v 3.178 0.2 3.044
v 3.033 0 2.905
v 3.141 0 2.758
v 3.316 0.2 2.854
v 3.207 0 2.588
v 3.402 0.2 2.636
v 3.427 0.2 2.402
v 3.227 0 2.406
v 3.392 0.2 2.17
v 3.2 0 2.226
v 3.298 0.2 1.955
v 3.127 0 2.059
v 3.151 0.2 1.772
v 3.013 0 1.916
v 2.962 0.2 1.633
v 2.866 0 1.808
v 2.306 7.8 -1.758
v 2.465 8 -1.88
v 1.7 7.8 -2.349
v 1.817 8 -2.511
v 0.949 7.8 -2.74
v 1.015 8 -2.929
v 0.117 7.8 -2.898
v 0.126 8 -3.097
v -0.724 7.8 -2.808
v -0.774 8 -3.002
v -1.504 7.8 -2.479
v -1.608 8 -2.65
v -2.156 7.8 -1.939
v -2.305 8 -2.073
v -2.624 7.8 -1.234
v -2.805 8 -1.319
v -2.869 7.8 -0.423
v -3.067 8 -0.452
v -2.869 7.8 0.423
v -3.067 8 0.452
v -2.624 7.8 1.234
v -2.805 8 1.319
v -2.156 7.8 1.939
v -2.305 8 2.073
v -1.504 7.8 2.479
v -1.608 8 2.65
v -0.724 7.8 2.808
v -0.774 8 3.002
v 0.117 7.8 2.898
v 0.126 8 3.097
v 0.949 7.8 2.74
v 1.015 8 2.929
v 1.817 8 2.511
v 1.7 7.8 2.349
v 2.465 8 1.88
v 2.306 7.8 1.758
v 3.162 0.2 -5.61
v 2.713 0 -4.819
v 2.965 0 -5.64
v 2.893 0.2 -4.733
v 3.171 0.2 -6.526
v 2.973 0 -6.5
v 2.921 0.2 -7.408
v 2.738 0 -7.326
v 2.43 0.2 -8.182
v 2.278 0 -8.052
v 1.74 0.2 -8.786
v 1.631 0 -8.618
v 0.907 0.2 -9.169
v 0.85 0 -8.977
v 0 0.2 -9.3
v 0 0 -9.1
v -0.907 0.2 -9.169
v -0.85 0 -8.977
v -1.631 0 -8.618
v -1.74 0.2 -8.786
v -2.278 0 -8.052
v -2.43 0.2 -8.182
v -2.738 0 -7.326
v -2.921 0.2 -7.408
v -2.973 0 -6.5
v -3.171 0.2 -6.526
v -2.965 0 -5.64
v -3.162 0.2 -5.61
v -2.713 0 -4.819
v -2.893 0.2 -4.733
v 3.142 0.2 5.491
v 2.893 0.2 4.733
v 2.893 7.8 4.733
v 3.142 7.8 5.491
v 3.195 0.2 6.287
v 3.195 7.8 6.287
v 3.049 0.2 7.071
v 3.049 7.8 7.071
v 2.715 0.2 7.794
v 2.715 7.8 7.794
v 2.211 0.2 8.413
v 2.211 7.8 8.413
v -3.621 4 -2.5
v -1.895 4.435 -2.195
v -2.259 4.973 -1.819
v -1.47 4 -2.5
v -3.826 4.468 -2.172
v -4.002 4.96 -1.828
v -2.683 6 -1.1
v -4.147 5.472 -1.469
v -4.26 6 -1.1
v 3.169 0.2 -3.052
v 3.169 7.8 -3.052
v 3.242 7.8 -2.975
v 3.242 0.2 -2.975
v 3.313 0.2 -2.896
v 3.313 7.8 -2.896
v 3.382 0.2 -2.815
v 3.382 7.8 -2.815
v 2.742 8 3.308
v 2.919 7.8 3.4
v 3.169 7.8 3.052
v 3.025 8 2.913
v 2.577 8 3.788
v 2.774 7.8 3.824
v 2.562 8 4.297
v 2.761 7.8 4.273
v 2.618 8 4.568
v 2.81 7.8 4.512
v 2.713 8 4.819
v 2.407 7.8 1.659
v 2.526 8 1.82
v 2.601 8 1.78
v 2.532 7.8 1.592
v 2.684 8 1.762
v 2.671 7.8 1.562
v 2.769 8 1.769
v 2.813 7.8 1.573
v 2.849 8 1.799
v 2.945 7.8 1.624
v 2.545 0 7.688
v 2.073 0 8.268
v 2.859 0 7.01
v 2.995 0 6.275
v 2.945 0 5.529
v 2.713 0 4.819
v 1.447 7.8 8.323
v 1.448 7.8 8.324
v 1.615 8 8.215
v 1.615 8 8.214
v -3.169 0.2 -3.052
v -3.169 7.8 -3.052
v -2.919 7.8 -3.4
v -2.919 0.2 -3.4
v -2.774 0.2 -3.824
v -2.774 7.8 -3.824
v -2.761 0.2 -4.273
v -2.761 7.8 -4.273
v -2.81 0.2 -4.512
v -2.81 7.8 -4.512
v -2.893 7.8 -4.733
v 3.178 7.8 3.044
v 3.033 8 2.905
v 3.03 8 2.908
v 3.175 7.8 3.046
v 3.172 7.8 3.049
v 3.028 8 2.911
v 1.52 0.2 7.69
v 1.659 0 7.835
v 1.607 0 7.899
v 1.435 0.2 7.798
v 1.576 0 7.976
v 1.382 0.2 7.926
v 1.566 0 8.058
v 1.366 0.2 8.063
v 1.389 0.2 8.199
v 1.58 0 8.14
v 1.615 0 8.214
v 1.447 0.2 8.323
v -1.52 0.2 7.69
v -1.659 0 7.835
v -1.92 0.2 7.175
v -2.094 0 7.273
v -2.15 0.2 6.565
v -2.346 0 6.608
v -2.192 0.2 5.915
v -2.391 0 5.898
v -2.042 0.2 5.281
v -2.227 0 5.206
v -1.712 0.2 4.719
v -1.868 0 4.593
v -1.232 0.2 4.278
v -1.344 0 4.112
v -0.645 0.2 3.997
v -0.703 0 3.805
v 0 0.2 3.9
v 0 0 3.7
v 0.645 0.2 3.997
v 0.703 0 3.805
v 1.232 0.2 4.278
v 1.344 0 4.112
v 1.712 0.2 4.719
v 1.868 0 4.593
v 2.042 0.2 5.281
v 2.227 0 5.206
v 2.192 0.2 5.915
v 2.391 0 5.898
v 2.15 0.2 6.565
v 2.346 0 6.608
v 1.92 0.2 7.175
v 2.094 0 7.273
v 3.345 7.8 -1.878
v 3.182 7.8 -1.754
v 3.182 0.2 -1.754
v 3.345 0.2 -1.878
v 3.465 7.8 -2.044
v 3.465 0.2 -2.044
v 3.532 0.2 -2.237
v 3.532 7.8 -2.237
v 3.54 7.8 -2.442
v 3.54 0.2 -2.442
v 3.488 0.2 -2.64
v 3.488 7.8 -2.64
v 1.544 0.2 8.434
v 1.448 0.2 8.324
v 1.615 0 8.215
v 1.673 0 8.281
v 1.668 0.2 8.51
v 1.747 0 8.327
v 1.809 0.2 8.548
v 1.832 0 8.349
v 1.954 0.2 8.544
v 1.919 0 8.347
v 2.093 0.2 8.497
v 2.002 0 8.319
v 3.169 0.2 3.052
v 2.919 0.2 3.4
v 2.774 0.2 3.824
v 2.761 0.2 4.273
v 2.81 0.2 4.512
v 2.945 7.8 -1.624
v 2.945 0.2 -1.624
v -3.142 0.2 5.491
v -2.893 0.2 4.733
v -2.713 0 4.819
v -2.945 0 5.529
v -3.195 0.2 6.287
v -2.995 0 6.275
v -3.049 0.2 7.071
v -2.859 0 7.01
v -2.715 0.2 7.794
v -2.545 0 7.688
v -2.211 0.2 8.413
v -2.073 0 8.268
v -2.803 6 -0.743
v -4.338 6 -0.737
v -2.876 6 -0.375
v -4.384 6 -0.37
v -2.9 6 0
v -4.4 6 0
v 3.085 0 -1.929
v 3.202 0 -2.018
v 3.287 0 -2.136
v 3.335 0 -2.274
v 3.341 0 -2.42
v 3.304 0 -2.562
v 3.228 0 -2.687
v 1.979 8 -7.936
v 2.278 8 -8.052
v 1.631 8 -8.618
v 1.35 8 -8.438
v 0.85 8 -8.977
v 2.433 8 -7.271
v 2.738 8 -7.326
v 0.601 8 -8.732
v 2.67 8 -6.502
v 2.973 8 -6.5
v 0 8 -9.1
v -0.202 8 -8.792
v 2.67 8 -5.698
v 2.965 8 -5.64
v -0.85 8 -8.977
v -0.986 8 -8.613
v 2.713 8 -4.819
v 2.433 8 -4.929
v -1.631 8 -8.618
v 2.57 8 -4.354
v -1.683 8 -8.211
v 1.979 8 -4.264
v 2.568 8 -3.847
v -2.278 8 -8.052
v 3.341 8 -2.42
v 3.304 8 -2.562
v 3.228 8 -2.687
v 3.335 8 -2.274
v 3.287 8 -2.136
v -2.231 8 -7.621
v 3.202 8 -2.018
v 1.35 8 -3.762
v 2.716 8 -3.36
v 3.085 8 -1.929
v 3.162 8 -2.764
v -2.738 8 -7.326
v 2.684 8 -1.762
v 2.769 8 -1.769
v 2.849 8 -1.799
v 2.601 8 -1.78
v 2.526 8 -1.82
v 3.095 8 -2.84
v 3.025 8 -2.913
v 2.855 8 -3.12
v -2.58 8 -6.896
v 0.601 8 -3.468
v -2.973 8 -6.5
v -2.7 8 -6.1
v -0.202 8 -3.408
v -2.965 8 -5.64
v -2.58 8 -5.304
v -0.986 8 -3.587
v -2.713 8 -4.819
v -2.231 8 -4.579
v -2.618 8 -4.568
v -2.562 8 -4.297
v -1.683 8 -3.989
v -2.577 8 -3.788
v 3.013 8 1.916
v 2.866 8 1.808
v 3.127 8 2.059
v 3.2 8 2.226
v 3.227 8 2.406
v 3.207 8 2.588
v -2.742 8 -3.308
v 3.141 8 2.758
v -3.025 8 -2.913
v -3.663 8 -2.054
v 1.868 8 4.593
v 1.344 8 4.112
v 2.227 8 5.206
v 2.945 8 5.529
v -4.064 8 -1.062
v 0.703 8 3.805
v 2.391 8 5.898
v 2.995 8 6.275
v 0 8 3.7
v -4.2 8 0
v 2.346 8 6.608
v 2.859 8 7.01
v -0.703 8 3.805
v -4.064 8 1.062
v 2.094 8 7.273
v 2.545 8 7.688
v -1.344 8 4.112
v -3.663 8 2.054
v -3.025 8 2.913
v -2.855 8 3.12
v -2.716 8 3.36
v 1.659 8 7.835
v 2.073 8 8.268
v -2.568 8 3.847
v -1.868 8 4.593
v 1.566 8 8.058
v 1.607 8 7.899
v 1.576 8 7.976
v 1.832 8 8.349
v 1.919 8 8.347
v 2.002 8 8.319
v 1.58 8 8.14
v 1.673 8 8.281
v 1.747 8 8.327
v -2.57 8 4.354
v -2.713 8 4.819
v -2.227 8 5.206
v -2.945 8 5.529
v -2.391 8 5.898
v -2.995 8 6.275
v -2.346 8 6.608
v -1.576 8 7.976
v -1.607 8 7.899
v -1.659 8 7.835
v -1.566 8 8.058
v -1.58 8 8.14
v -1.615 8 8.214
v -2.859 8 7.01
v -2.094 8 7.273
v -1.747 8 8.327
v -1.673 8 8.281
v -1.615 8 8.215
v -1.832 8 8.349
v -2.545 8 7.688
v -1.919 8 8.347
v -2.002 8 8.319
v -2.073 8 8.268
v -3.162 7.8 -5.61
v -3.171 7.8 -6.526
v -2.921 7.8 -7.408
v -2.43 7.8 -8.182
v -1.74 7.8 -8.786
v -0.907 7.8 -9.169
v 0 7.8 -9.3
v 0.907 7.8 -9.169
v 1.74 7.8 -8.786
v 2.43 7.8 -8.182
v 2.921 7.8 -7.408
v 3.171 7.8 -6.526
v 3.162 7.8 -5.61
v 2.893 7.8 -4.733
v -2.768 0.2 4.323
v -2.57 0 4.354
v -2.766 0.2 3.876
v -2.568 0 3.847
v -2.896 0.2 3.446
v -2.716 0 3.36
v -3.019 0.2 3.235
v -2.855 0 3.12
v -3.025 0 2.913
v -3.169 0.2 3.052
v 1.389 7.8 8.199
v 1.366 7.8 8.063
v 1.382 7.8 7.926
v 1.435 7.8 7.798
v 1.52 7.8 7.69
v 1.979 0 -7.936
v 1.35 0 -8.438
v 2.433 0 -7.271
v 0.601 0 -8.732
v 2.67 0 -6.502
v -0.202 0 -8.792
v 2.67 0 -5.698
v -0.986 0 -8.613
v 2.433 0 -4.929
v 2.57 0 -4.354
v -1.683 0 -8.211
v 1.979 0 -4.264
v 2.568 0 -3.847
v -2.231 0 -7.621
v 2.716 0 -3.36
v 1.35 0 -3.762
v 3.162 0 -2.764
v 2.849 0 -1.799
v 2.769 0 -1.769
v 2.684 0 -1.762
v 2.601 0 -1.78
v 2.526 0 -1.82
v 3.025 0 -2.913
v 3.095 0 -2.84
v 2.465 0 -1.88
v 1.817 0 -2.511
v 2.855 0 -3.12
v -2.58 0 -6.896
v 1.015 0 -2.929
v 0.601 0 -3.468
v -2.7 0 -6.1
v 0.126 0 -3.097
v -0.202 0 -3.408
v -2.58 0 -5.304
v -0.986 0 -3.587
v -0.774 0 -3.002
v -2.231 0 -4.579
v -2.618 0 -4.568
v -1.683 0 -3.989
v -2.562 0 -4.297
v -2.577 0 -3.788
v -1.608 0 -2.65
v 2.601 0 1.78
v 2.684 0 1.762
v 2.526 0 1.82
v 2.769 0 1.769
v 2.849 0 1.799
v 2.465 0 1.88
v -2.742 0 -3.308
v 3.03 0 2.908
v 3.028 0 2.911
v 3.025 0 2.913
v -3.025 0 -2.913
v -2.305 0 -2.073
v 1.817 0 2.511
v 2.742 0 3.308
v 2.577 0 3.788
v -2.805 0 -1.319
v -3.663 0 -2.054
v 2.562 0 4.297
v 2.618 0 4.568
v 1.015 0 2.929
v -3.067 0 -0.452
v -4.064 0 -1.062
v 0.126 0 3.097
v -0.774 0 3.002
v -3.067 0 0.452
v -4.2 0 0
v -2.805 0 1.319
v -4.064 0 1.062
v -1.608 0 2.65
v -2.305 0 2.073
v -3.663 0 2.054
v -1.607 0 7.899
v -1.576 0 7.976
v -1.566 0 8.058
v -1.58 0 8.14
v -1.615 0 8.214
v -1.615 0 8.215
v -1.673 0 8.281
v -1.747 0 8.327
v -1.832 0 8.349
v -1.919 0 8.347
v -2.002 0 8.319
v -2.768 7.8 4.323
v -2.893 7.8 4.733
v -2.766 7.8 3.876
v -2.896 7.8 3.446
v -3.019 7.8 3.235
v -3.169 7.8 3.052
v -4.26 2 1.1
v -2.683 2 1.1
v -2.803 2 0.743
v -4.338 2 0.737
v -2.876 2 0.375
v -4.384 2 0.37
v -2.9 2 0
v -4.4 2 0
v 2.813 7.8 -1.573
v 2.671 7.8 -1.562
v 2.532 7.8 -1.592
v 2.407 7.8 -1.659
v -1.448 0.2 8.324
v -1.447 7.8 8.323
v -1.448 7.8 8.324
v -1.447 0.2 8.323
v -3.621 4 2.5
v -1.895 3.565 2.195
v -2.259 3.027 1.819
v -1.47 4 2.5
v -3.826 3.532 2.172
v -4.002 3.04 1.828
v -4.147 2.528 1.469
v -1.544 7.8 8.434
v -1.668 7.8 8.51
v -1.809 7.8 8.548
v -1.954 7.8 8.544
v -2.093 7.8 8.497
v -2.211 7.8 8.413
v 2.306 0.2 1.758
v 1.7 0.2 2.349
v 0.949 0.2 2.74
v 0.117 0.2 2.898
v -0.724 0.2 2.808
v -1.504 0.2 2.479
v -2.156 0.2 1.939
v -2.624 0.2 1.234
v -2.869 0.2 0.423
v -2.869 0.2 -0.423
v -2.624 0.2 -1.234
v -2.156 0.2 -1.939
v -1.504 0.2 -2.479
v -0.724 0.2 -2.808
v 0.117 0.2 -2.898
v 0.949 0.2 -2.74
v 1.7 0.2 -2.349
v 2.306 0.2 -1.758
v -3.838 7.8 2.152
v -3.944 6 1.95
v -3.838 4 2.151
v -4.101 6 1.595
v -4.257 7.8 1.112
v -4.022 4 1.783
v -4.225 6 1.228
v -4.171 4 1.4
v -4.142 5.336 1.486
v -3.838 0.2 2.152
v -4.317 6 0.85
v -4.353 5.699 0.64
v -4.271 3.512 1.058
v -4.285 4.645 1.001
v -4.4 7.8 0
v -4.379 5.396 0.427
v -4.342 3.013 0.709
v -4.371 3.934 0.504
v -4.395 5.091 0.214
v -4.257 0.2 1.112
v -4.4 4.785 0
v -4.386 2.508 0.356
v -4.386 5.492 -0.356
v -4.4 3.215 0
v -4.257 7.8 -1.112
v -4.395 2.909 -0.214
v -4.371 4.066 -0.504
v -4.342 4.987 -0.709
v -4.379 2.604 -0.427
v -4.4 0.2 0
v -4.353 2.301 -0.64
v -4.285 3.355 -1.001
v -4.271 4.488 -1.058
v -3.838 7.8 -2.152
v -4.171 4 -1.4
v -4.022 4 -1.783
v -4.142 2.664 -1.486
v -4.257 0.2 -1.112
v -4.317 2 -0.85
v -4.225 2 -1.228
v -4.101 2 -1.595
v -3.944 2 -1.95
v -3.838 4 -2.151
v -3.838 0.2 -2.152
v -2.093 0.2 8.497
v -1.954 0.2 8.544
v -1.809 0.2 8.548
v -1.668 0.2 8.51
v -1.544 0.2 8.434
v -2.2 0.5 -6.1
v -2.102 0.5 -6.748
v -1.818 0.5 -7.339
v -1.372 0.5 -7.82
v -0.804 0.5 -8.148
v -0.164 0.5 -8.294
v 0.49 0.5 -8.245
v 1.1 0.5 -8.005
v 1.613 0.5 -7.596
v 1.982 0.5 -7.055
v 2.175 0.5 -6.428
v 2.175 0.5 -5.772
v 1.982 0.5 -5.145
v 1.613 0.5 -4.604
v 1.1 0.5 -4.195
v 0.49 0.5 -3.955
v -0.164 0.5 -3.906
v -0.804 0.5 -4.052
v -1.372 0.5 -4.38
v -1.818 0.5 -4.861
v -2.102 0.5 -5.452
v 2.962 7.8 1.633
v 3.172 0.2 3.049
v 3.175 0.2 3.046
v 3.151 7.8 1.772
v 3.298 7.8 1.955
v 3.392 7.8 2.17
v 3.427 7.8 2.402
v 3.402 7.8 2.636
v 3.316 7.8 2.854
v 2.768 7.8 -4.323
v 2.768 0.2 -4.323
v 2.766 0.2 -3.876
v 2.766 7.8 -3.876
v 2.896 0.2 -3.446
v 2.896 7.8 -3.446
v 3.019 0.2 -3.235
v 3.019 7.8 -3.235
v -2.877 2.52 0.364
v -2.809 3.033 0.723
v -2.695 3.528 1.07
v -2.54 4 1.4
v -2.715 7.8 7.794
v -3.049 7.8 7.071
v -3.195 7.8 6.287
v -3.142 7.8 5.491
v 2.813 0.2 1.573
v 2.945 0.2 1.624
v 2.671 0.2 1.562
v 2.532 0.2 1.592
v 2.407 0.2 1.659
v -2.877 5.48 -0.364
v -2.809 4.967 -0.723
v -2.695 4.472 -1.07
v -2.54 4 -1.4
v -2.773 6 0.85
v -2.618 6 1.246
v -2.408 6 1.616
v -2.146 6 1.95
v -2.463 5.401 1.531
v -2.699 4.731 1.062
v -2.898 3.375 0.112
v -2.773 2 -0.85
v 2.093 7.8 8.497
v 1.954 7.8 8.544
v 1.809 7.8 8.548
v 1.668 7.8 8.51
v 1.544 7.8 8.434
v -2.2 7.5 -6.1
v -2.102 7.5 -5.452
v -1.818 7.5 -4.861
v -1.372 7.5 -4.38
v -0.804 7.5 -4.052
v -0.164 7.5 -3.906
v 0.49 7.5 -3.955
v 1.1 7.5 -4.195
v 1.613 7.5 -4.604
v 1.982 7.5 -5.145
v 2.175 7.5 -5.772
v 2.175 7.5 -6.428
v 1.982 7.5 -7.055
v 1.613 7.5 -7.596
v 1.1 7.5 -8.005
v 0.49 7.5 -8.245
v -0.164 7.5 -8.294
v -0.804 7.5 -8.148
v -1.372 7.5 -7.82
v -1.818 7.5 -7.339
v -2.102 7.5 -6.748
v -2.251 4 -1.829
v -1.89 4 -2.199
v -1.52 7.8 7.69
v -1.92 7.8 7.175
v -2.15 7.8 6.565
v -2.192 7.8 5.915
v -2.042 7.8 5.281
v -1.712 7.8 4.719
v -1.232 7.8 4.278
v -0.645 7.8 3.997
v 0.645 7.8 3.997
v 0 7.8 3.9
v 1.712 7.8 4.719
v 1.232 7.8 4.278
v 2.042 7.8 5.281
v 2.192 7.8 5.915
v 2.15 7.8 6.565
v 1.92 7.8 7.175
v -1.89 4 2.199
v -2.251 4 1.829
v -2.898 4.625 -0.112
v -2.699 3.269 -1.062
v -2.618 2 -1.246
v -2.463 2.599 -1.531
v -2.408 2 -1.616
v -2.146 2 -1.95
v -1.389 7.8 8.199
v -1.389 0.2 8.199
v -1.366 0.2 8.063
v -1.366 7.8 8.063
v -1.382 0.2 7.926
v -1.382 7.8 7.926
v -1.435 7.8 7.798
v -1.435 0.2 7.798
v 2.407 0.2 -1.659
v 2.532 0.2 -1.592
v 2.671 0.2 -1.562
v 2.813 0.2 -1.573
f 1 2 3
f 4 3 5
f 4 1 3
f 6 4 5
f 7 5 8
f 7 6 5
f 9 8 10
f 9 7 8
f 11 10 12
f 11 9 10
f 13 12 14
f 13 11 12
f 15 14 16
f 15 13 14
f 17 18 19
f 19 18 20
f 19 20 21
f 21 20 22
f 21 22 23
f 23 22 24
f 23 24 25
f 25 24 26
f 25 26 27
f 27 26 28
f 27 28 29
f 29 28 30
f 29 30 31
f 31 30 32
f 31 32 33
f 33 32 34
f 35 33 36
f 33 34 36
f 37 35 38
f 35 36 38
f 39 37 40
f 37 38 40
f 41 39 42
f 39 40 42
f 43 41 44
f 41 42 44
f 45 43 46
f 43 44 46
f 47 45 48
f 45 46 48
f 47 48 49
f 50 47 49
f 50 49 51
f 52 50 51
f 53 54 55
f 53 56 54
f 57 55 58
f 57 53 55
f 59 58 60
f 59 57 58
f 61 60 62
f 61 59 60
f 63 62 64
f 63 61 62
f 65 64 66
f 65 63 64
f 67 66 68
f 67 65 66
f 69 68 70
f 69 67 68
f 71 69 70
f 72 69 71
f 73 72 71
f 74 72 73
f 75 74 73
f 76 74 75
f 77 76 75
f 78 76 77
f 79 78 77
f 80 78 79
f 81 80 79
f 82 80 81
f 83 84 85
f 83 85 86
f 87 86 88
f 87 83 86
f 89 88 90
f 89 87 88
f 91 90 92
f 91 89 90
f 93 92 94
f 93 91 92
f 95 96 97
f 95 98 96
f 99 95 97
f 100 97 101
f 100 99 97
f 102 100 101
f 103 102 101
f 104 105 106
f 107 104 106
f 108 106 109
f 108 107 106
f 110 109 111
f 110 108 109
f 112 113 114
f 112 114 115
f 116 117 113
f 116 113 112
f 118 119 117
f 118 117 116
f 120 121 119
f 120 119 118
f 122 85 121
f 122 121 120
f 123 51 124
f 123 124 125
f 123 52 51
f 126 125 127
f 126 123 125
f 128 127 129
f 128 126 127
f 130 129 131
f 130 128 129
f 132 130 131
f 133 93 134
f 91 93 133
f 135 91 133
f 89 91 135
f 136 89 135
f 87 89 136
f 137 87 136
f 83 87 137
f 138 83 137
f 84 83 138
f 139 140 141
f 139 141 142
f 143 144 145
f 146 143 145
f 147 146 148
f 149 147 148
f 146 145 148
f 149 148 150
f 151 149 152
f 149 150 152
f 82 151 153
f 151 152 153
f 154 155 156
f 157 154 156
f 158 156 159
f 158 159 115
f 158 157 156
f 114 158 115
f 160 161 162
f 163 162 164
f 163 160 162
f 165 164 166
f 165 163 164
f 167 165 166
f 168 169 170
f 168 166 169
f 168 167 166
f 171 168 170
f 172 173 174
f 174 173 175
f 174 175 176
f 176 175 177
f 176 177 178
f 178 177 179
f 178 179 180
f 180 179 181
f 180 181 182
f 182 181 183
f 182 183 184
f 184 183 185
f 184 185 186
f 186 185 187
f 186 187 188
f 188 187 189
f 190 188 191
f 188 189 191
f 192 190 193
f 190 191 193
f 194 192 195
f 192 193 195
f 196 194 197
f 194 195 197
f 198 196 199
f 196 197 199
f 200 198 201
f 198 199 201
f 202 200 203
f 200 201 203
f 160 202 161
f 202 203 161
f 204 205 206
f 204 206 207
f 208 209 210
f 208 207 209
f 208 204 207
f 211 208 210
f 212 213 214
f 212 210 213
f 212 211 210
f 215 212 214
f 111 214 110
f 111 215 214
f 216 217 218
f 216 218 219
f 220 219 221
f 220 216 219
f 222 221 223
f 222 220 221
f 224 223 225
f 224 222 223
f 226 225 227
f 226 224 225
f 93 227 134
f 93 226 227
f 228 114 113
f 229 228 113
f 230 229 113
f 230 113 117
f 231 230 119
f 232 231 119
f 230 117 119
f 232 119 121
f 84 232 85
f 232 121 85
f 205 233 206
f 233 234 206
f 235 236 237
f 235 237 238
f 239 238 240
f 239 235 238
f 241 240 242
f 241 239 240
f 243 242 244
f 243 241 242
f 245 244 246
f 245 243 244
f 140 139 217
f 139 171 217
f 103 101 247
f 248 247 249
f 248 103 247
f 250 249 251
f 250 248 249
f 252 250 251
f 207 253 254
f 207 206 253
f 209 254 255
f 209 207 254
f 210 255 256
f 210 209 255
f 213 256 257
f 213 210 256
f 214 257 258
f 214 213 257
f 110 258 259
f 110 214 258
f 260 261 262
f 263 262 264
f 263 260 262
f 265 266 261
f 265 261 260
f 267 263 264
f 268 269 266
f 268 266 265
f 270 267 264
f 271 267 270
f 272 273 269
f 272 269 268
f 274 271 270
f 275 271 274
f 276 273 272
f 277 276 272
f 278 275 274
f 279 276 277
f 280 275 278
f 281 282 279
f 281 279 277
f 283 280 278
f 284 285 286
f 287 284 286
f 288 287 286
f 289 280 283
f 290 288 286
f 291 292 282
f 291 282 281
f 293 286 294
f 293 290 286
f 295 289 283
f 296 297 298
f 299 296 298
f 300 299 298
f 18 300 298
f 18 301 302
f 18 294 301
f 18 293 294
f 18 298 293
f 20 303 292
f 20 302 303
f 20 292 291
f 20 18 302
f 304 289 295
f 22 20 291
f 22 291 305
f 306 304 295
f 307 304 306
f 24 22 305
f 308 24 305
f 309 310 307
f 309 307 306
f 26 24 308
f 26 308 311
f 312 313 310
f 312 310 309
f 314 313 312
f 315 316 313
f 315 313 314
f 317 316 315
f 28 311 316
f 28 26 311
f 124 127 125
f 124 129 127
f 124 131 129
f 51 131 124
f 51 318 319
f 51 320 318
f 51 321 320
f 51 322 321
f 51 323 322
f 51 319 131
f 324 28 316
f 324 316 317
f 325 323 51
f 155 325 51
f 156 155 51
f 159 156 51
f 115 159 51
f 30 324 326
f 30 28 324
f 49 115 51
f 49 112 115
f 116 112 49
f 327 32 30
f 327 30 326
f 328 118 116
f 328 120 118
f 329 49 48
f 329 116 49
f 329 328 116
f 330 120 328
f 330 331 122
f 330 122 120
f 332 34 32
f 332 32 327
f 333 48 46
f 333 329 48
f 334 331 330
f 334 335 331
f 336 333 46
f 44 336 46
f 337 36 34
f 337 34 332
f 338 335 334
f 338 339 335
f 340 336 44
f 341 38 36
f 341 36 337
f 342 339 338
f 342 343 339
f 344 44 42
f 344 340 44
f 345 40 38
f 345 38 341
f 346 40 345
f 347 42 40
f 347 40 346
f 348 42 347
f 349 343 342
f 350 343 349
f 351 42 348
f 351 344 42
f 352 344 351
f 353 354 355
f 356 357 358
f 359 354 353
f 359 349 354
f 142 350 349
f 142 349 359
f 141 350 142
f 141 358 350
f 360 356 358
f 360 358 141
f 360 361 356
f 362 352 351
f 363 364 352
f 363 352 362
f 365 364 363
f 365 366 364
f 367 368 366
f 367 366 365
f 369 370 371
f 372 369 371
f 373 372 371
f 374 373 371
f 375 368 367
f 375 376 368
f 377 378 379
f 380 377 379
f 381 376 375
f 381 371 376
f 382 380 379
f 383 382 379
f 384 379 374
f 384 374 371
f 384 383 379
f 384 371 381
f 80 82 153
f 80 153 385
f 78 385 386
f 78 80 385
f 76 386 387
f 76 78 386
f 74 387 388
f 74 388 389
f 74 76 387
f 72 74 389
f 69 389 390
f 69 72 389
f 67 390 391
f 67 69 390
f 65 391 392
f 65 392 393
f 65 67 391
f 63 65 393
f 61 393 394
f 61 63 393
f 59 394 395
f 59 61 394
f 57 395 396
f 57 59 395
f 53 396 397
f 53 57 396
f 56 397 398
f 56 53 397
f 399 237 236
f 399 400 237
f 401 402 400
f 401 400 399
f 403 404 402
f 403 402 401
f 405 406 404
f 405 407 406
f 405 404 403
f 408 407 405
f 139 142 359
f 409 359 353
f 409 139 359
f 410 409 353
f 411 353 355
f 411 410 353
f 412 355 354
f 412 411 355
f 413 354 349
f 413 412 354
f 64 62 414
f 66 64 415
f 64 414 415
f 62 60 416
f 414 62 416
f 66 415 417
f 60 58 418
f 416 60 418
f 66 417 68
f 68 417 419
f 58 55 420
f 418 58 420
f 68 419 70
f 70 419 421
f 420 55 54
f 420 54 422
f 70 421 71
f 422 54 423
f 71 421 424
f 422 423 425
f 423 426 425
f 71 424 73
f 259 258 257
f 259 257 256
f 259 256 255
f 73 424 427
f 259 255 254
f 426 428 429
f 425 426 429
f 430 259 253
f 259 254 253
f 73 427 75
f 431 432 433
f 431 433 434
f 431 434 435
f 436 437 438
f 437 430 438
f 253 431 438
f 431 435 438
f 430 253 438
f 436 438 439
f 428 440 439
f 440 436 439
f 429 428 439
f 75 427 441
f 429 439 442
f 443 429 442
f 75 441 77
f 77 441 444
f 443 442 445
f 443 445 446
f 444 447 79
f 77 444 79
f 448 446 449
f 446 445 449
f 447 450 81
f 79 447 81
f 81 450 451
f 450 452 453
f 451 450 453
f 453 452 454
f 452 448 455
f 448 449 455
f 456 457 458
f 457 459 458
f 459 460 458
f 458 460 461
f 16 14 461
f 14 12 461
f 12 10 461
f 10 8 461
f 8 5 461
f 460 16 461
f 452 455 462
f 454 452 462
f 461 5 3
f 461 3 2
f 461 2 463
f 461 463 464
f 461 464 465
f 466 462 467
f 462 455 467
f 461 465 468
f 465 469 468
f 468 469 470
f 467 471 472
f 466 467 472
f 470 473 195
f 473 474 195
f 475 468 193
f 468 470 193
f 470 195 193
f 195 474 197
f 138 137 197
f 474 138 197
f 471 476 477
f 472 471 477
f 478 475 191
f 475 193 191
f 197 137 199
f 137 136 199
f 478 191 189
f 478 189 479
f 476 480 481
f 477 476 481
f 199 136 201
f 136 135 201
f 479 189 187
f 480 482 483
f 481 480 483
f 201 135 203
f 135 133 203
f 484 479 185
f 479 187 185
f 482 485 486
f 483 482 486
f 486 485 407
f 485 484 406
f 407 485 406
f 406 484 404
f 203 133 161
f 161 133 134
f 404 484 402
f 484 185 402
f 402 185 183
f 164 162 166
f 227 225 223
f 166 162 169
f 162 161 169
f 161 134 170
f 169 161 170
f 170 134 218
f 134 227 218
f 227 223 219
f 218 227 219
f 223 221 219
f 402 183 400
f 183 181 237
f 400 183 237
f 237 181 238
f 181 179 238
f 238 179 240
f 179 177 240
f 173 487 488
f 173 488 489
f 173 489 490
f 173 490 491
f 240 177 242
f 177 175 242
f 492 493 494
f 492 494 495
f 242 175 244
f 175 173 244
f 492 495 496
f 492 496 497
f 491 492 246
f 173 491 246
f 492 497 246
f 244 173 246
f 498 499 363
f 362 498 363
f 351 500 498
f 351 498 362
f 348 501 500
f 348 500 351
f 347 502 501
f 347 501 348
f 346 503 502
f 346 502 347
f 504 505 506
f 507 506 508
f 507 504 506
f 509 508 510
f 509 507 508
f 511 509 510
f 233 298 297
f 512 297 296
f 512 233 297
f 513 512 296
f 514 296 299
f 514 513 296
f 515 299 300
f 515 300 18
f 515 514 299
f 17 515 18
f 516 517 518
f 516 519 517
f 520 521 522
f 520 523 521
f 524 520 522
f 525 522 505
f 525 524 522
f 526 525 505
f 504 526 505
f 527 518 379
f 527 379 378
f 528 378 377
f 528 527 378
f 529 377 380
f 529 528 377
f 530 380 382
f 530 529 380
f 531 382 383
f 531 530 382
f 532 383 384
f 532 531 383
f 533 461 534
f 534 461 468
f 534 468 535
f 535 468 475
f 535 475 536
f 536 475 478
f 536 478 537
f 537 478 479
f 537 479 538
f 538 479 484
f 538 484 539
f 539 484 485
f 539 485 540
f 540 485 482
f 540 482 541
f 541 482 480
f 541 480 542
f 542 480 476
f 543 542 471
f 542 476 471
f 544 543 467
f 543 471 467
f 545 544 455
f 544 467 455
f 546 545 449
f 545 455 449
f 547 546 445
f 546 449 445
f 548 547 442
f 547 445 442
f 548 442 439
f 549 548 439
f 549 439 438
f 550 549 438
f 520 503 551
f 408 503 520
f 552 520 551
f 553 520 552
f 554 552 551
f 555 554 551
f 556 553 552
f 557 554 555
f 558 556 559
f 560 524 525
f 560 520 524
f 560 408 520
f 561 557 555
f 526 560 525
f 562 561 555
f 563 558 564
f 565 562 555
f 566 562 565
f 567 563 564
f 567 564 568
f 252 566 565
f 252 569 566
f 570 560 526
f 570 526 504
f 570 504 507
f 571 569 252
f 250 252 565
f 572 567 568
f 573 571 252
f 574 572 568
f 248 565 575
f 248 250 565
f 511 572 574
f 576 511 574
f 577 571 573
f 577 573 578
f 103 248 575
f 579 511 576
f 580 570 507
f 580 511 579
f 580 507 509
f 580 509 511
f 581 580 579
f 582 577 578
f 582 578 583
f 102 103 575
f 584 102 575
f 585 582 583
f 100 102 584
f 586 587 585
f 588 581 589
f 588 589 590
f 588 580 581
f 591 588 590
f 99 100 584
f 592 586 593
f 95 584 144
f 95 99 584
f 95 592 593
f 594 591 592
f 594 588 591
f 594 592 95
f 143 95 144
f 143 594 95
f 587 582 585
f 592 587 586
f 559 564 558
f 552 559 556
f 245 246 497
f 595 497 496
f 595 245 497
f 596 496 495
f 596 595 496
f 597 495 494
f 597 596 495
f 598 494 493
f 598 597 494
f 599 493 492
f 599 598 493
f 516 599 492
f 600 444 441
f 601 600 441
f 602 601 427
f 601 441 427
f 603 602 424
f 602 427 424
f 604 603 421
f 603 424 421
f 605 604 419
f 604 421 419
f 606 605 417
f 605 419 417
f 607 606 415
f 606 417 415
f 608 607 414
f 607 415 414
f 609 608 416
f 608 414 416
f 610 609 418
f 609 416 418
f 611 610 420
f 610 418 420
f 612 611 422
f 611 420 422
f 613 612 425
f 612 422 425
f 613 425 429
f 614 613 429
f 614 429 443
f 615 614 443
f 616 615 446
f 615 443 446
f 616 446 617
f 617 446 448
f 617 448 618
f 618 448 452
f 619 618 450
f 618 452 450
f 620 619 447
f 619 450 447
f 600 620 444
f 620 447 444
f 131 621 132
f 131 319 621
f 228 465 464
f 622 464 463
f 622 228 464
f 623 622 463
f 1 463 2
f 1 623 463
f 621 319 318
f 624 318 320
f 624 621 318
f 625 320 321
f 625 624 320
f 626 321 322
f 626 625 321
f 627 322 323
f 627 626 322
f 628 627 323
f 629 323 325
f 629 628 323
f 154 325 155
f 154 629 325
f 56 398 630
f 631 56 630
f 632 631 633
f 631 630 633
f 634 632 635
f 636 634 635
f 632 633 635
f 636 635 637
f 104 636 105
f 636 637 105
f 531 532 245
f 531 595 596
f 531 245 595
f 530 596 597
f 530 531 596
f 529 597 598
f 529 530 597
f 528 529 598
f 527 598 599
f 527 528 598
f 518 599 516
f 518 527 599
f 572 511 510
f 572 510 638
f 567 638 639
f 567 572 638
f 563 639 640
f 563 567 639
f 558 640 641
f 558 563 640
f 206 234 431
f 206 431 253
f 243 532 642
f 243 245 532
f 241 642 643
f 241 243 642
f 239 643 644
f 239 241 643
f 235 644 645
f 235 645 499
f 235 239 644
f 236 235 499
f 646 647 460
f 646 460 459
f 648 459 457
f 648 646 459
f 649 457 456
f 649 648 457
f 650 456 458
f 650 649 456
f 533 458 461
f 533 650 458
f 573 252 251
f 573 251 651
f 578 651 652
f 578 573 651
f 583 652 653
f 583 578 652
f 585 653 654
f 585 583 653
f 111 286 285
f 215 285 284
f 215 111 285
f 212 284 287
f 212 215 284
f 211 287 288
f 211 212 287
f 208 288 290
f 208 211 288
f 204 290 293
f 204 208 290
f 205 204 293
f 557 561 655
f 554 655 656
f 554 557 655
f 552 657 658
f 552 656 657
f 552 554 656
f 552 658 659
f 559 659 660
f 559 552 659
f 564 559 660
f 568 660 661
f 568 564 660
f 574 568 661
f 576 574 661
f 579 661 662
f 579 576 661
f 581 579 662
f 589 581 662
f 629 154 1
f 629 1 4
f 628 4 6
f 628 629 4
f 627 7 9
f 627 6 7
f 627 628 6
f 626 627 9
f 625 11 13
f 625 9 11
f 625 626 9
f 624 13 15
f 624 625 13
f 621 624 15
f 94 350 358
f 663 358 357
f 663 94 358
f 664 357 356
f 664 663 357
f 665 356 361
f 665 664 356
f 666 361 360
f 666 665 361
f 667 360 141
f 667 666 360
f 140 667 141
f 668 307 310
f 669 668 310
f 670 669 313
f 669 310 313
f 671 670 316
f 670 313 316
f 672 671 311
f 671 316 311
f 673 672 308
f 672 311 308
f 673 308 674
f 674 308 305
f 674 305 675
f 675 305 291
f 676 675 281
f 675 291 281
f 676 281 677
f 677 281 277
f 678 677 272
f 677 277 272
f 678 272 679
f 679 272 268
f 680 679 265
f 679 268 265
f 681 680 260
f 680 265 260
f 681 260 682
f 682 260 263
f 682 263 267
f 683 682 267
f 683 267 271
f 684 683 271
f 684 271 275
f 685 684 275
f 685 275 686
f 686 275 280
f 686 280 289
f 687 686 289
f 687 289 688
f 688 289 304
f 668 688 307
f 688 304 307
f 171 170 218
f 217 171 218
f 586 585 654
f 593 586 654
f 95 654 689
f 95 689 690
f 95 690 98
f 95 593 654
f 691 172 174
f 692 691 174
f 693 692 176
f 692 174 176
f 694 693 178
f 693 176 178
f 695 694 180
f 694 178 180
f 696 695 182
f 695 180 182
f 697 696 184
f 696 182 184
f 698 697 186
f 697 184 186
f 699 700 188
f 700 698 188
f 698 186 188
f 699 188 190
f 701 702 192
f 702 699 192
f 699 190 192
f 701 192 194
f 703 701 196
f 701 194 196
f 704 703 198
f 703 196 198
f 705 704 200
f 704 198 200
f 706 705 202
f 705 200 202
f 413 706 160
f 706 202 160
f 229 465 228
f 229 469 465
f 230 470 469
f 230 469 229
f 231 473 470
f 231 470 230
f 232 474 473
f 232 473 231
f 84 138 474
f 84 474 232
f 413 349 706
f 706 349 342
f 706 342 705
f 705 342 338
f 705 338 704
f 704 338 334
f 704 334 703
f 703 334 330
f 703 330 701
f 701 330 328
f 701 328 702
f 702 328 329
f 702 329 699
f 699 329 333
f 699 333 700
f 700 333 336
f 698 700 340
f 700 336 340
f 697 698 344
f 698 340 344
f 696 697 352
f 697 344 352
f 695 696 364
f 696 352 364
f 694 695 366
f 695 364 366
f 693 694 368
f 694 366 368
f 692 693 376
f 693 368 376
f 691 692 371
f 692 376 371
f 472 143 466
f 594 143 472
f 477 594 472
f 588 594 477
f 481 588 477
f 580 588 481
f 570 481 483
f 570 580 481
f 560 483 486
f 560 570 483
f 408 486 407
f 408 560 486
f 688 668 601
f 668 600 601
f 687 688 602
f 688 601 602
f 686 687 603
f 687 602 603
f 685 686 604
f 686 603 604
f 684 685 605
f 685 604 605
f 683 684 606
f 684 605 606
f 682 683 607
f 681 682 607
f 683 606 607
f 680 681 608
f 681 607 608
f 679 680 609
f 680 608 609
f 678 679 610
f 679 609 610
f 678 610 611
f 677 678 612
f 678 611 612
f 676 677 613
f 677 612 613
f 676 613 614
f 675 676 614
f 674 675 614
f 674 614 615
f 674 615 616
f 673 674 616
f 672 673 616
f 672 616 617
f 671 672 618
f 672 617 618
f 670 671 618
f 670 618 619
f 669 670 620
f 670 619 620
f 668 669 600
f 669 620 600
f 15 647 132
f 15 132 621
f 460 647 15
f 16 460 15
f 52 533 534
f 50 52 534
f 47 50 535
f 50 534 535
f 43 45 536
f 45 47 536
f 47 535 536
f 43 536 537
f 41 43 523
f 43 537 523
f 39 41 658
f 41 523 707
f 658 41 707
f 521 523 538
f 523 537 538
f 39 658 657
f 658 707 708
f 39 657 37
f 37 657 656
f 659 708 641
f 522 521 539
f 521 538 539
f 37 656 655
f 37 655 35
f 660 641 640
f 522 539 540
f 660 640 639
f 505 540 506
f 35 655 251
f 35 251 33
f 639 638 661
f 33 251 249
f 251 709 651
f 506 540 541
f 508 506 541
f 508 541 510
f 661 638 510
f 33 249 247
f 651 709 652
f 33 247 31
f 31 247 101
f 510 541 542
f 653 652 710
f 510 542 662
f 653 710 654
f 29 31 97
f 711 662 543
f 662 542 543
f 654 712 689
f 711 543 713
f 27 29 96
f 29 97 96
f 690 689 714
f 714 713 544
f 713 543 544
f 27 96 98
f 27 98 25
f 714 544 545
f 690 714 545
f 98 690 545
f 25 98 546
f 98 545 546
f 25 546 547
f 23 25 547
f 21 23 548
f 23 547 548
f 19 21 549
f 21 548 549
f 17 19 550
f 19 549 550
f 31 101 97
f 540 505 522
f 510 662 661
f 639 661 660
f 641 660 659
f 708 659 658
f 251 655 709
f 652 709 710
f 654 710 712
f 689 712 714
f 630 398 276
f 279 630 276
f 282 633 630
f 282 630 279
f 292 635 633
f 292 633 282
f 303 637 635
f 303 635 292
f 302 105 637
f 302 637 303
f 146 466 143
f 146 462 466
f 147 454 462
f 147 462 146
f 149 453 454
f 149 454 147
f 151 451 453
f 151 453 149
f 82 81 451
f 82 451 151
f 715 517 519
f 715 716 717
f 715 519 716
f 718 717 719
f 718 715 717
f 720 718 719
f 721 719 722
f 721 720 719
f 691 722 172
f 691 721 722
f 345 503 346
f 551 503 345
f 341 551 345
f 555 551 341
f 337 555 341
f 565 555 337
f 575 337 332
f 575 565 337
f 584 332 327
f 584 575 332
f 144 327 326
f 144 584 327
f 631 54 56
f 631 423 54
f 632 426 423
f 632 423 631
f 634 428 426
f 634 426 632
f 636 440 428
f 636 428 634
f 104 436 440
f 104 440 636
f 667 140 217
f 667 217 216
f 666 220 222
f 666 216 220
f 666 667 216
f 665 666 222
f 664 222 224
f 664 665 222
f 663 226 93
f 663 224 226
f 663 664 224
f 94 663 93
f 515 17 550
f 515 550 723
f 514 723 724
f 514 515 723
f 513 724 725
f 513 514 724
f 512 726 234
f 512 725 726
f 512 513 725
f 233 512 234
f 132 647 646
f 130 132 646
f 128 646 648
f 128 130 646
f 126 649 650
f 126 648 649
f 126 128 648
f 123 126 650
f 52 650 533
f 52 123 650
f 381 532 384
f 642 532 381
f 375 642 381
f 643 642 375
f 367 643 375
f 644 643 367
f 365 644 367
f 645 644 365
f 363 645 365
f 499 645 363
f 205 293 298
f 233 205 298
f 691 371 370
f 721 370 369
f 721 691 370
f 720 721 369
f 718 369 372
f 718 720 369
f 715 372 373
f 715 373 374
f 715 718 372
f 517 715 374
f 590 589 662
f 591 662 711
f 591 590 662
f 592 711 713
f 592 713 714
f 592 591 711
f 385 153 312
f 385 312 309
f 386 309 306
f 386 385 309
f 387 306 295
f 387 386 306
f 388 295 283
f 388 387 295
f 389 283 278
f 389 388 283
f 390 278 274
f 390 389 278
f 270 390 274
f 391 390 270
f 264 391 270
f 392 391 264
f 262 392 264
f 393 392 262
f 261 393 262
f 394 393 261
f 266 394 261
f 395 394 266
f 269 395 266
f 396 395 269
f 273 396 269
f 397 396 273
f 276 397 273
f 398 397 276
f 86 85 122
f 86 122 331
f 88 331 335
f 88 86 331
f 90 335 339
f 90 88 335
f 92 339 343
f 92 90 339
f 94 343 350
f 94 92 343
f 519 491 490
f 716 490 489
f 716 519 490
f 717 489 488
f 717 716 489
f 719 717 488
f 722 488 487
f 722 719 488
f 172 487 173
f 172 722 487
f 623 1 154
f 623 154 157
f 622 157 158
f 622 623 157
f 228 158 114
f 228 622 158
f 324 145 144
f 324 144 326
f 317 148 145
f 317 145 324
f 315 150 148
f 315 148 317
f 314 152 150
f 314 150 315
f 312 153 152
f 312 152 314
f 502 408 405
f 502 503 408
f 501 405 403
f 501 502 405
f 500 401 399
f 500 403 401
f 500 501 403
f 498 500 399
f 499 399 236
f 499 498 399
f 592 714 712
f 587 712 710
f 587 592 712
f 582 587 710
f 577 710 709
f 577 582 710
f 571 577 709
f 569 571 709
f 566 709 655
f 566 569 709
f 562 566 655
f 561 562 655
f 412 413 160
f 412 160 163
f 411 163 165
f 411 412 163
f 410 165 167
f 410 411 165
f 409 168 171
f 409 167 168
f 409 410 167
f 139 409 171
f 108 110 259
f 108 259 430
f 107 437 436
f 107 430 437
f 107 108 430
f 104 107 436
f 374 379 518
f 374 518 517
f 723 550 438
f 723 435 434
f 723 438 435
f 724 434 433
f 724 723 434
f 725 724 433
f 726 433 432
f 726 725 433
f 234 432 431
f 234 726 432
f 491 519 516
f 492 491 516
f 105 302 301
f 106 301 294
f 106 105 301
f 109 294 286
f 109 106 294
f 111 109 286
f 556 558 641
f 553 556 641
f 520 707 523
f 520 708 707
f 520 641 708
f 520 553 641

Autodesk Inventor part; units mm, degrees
ref_plane "XZ Plane" through (0, 0, 0) normal (0, 1, 0) x (-1, 0, 0)
ref_plane "XY Plane" through (0, 0, 0) normal (0, 0, 1) x (1, 0, 0)
sketch "Sketch1" plane through (0, 0, 0) normal (0, 1, 0) x (-1, 0, 0)
  circle A0 centre (0, 0) radius 2.9
  circle A1 centre (0, -6.1) radius 2.2
  circle A2 centre (0, 6.1) radius 2.2
  circle A3 centre (0, 0) radius 4.4
  circle A4 centre (0, -6.1) radius 3.2
  circle A5 centre (0, 6.1) radius 3.2
  line L0 (-2.5397, -1.4) -> (-3.8533, -2.1241)
  line L1 (-2.5397, 1.4) -> (-3.8533, 2.1241)
  line L2 (1.2, 7.9439) -> (1.7455, 8.782)
  line L3 (-1.2, 7.9439) -> (-1.7455, 8.782)
  point P0 (-2.2223, -3.7975)
  point P1 (2.2223, -3.7975)
  point P2 (2.2223, 3.7975)
  point P3 (-2.2223, 3.7975)
  dimension "d0" = 5.8
  dimension "d1" = 4.4
  dimension "d2" = 4.4
  dimension "d3" = 6.1
  dimension "d4" = 6.1
  dimension "d5" = 1.5
  dimension "d6" = 1
  dimension "d7" = 1
  dimension "d10" = 2.8
  dimension "d11" = 1.4
  dimension "d13" = 2.4
  dimension "d14" = 1.2
extrude "Extrusion1" add sketch "Sketch1" along normal blind 8 contours L1 A3 A5 A0 | A0 A4 A3 L0 | A5 A3 A4 A0 | A5 A3 A2 | A4 A3 A1 | A5 L3 A2 A3 | A3 A2 L2 A5 | A4 A3 A1
fillet "Fillet1" radius 1.5 4 edges at (2.2223, 4, -3.7975) (-2.2223, 4, -3.7975) (-2.2223, 4, 3.7975) (2.2223, 4, 3.7975)
fillet "Fillet2" radius 0.9 1 edges at (3.8533, 4, 2.1241)
fillet "Fillet3" radius 0.5 2 edges at (2.5397, 4, -1.4) (2.5397, 4, 1.4)
fillet "Fillet4" radius 0.7 1 edges at (3.8533, 4, -2.1241)
fillet "Fillet5" radius 0.5 4 edges at (-1.2, 4, 7.9439) (1.2, 4, 7.9439) (-1.7455, 4, 8.782) (1.7455, 4, 8.782)
ref_plane "Work Plane1" through (-4.4, 0, 0) normal (1, 0, 0) x (0, 1, 0)
sketch "Sketch2" plane through (-4.4, 0, 0) normal (1, 0, 0) x (0, 1, 0)
  line L0 (6, -1.0996) -> (6, 0.0004)
  line L1 (6, 0.0004) -> (4, -1.4)
  line L2 (4, -1.4) -> (4, -2.5)
  line L3 (4, -2.5) -> (6, -1.0996)
  line L4 (6, 0.8504) -> (6, 1.9504)
  line L5 (6, 1.9504) -> (2, -0.8504)
  line L6 (2, -0.8504) -> (2, -1.9504)
  line L7 (2, -1.9504) -> (6, 0.8504)
  line L8 (4, 1.4) -> (4, 2.5)
  line L9 (4, 2.5) -> (2, 1.0996)
  line L10 (2, 1.0996) -> (2, -0.0004)
  line L11 (2, -0.0004) -> (4, 1.4)
  line L12 (2, -0.8504) -> (2, -0.0004) construction
  line L13 (6, 0.0004) -> (6, 0.8504) construction
  line L14 (0, -3.0521) -> (0, 3.0521) construction
  point P0 (0, 0)
  point P1 (0, 0)
  point P2 (0, 0)
  dimension "d19" = 125
  dimension "d20" = 4
  dimension "d21" = 5
  dimension "d22" = 0.85
  dimension "d23" = 2.5
  dimension "d24" = 2
extrude "Extrusion2" cut sketch "Sketch2" along normal up to surface
chamfer "Chamfer1" distance 0.5 angle 45 2 edges at (2.2, 8, -6.1) (2.2, 0, -6.1)
chamfer "Chamfer2" distance 0.2 angle 45 40 edges at (-2.9, 8, 0) (2.6007, 8, -1.5722) (3.0635, 8, -1.6887) (3.5317, 8, -2.2372) (3.2777, 8, -2.9354) (2.7696, 8, -3.8497) (0, 8, -9.3) (-2.7696, 8, -3.8497) (-4.4, 8, 0) (-2.7696, 8, 3.8497) (-3.1464, 8, 6.6832) (-1.3695, 8, 7.9935) (0, 8, 3.9) (1.3695, 8, 7.9935) (3.1464, 8, 6.6832) (2.7696, 8, 3.8497) (3.1734, 8, 3.0478) (3.4173, 8, 2.2851) (2.9536, 8, 1.6282) (2.6007, 8, 1.5722) (-3.1464, 0, 6.6832) (-1.3695, 0, 7.9935) (0, 0, 3.9) (1.3695, 0, 7.9935) (3.1464, 0, 6.6832) (2.7696, 0, 3.8497) (3.1734, 0, 3.0478) (3.4173, 0, 2.2851) (2.9536, 0, 1.6282) (2.6007, 0, 1.5722) (-2.9, 0, 0) (2.6007, 0, -1.5722) (3.0635, 0, -1.6887) (3.5317, 0, -2.2372) (3.2777, 0, -2.9354) (2.7696, 0, -3.8497) (0, 0, -9.3) (-2.7696, 0, -3.8497) (-4.4, 0, 0) (-2.7696, 0, 3.8497)
properties part number "umbilicalClip"
